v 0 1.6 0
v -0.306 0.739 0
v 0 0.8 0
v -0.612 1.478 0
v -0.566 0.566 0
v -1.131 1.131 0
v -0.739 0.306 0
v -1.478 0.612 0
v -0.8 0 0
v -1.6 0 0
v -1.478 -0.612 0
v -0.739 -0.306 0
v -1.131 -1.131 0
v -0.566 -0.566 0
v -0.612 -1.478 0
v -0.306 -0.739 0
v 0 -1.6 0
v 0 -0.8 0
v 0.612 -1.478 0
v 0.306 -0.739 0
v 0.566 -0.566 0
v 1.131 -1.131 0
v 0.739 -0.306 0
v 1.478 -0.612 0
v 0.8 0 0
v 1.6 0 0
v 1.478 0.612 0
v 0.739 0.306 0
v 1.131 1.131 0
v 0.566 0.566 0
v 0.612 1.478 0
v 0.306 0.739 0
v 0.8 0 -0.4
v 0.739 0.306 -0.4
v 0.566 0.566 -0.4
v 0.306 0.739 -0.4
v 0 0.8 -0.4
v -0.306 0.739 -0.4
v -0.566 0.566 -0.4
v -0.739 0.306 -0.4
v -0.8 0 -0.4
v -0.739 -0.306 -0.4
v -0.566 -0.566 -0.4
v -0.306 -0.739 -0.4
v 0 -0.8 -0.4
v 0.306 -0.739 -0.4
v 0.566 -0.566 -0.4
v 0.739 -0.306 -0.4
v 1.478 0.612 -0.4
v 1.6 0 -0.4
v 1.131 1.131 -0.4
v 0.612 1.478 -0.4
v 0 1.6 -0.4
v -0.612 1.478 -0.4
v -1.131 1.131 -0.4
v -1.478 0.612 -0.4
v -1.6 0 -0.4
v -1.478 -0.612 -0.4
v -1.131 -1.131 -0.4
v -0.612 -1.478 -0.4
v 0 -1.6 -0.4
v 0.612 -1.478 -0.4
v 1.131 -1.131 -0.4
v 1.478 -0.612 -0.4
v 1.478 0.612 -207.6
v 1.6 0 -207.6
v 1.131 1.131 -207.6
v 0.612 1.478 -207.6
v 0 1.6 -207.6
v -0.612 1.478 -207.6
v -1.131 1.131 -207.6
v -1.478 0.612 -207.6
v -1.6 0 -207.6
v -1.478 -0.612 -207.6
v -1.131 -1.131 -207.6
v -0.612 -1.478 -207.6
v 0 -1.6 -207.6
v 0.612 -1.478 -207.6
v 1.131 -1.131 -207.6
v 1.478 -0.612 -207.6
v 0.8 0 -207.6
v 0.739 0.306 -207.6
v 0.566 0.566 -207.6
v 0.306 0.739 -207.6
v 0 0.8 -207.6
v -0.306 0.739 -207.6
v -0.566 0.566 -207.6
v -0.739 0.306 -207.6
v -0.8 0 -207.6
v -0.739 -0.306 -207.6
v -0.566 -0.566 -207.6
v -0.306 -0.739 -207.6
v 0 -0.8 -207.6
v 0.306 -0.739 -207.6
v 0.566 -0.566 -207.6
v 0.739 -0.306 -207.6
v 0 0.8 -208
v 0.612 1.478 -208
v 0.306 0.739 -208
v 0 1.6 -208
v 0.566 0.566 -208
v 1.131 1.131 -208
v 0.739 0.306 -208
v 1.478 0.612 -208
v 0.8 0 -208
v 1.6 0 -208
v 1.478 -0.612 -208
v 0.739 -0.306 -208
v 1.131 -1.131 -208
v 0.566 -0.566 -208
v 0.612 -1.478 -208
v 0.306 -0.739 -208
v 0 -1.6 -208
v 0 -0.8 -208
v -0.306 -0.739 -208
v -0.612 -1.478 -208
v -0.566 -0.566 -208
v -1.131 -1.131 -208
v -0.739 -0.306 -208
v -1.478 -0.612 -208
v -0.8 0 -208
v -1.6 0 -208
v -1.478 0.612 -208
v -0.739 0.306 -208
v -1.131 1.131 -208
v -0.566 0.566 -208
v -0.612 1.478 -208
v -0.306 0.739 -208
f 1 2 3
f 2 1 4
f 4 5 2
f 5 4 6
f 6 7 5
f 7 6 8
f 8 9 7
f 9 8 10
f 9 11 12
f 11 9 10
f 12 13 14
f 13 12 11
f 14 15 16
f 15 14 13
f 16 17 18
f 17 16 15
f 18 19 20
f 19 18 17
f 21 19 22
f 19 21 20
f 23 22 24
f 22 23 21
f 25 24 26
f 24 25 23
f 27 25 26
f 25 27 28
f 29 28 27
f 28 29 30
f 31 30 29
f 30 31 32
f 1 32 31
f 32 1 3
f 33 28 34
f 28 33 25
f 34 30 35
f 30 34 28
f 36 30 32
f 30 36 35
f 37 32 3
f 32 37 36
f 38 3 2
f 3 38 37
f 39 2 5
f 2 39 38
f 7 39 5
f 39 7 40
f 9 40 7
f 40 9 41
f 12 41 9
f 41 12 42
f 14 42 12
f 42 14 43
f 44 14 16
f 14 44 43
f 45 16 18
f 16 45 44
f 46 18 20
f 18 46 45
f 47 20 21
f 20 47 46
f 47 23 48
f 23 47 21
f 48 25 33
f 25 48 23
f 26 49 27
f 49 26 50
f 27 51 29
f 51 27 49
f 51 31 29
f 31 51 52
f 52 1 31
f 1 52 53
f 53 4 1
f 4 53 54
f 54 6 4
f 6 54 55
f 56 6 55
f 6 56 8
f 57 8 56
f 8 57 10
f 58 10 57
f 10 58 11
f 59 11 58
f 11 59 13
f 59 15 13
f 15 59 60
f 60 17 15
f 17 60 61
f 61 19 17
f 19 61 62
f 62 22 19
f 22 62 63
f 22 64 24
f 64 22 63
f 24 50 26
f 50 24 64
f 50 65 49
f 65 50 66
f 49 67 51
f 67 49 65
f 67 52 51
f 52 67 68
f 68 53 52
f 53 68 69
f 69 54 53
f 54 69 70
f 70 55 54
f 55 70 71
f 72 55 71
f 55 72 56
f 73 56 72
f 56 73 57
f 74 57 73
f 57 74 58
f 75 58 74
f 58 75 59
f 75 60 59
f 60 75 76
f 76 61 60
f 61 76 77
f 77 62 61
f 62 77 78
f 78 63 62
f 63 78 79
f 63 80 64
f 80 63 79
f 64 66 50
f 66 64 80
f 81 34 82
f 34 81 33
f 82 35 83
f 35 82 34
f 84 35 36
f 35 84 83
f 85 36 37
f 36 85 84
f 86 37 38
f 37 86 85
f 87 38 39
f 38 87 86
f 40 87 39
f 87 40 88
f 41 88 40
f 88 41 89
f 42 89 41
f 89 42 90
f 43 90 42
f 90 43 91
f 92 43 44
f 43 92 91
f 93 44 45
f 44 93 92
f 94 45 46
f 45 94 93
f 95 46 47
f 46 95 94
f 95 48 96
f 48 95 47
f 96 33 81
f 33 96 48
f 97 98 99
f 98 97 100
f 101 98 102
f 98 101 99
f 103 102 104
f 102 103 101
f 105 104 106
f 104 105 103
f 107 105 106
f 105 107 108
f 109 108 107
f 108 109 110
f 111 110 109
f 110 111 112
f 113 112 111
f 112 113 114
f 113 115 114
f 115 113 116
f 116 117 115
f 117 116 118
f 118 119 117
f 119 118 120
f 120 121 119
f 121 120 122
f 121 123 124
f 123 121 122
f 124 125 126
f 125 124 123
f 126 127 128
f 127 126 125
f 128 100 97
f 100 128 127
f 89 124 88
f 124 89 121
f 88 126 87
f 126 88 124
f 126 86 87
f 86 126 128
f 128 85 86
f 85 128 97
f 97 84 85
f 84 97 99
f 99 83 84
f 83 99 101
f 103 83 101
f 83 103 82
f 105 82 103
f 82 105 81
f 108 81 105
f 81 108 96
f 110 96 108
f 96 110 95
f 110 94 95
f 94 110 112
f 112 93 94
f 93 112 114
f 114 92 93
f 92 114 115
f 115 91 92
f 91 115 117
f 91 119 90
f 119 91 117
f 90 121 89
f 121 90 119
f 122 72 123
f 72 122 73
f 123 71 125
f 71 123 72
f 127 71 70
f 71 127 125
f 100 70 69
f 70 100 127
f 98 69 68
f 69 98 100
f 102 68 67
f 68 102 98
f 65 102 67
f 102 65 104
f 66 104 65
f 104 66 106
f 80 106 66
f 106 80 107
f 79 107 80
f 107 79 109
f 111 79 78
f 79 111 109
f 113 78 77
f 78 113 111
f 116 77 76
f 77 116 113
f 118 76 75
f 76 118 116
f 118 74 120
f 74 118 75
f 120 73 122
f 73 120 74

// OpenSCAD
// file: ../p/4-4ring1.scad
use <../lib.scad>
function ldraw_lib__4_4ring1() = [
// 0 Ring  1 x 1.0
// 0 Name: 4-4ring1.dat
// 0 Author: James Jessiman
// 0 !LDRAW_ORG Primitive UPDATE 2009-01
// 0 !LICENSE Licensed under CC BY 4.0 : see CAreadme.txt
// 
// 0 BFC CERTIFY CCW
  [0,"BFC","CERTIFY"],
  [0,"BFC","CCW"],
// 
// 0 !HISTORY 1998-12-15 [PTadmin] Official Update 1998-10
// 0 !HISTORY 2002-04-08 [BrickCaster] Modified for BFC compliance
// 0 !HISTORY 2002-04-25 [PTadmin] Official Update 2002-02
// 0 !HISTORY 2007-06-24 [PTadmin] Header formatted for Contributor Agreement
// 0 !HISTORY 2008-07-01 [PTadmin] Official Update 2008-01
// 0 !HISTORY 2008-08-26 [cwdee] Switch polygon winding and rename
// 0 !HISTORY 2009-05-02 [PTadmin] Official Update 2009-01
// 
// 
// 4 16 -0.7654 0 1.8478 -0.3827 0 0.9239 0 0 1 0 0 2
  [4,16,-0.7654,0,1.8478,-0.3827,0,0.9239,0,0,1,0,0,2],
// 4 16 -1.4142 0 1.4142 -0.7071 0 0.7071 -0.3827 0 0.9239 -0.7654 0 1.8478
  [4,16,-1.4142,0,1.4142,-0.7071,0,0.7071,-0.3827,0,0.9239,-0.7654,0,1.8478],
// 4 16 -1.8478 0 0.7654 -0.9239 0 0.3827 -0.7071 0 0.7071 -1.4142 0 1.41420
  [4,16,-1.8478,0,0.7654,-0.9239,0,0.3827,-0.7071,0,0.7071,-1.4142,0,1.41420],
// 4 16 -2 0 0 -1 0 0 -0.9239 0 0.3827 -1.8478 0 0.7654
  [4,16,-2,0,0,-1,0,0,-0.9239,0,0.3827,-1.8478,0,0.7654],
// 4 16 -1.8478 0 -0.7654 -0.9239 0 -0.3827 -1 0 0 -2 0 0
  [4,16,-1.8478,0,-0.7654,-0.9239,0,-0.3827,-1,0,0,-2,0,0],
// 4 16 -1.4142 0 -1.4142 -0.7071 0 -0.7071 -0.9239 0 -0.3827 -1.8478 0 -0.7654
  [4,16,-1.4142,0,-1.4142,-0.7071,0,-0.7071,-0.9239,0,-0.3827,-1.8478,0,-0.7654],
// 4 16 -0.7654 0 -1.8478 -0.3827 0 -0.9239 -0.7071 0 -0.7071 -1.4142 0 -1.4142
  [4,16,-0.7654,0,-1.8478,-0.3827,0,-0.9239,-0.7071,0,-0.7071,-1.4142,0,-1.4142],
// 4 16 0 0 -2 0 0 -1 -0.3827 0 -0.9239 -0.7654 0 -1.8478
  [4,16,0,0,-2,0,0,-1,-0.3827,0,-0.9239,-0.7654,0,-1.8478],
// 4 16 0.7654 0 -1.8478 0.3827 0 -0.9239 0 0 -1 0 0 -2
  [4,16,0.7654,0,-1.8478,0.3827,0,-0.9239,0,0,-1,0,0,-2],
// 4 16 1.4142 0 -1.4142 0.7071 0 -0.7071 0.3827 0 -0.9239 0.7654 0 -1.8478
  [4,16,1.4142,0,-1.4142,0.7071,0,-0.7071,0.3827,0,-0.9239,0.7654,0,-1.8478],
// 4 16 1.8478 0 -0.7654 0.9239 0 -0.3827 0.7071 0 -0.7071 1.4142 0 -1.4142
  [4,16,1.8478,0,-0.7654,0.9239,0,-0.3827,0.7071,0,-0.7071,1.4142,0,-1.4142],
// 4 16 2 0 0 1 0 0 0.9239 0 -0.3827 1.8478 0 -0.7654
  [4,16,2,0,0,1,0,0,0.9239,0,-0.3827,1.8478,0,-0.7654],
// 4 16 1.8478 0 0.7654 0.9239 0 0.3827 1 0 0 2 0 0
  [4,16,1.8478,0,0.7654,0.9239,0,0.3827,1,0,0,2,0,0],
// 4 16 1.4142 0 1.4142 0.7071 0 0.7071 0.9239 0 0.3827 1.8478 0 0.7654
  [4,16,1.4142,0,1.4142,0.7071,0,0.7071,0.9239,0,0.3827,1.8478,0,0.7654],
// 4 16 0.7654 0 1.8478 0.3827 0 0.9239 0.7071 0 0.7071 1.4142 0 1.4142
  [4,16,0.7654,0,1.8478,0.3827,0,0.9239,0.7071,0,0.7071,1.4142,0,1.4142],
// 4 16 0 0 2 0 0 1 0.3827 0 0.9239 0.7654 0 1.8478
  [4,16,0,0,2,0,0,1,0.3827,0,0.9239,0.7654,0,1.8478],
// 0
];
module ldraw_lib__4_4ring1(step=0, col=false, unit=2/5, alt=false, line=0.2, solid=!$preview)
    makepoly(ldraw_lib__4_4ring1(), step=step, col=col, unit=unit, alt=alt, line=line, solid=solid);
ldraw_lib__4_4ring1(line=0.2);
// file: ../p/4-4edge.scad
use <../lib.scad>
function ldraw_lib__4_4edge() = [
// 0 Circle 1.0
// 0 Name: 4-4edge.dat
// 0 Author: James Jessiman
// 0 !LDRAW_ORG Primitive UPDATE 2017-01
// 0 !LICENSE Licensed under CC BY 4.0 : see CAreadme.txt
// 
// 0 BFC CERTIFY CCW
  [0,"BFC","CERTIFY"],
  [0,"BFC","CCW"],
// 
// 0 !HISTORY 1998-12-15 [PTadmin] Official Update 1998-10
// 0 !HISTORY 2005-12-28 [PTadmin] Official Update 2005-01
// 0 !HISTORY 2007-06-24 [PTadmin] Header formatted for Contributor Agreement
// 0 !HISTORY 2008-07-01 [PTadmin] Official Update 2008-01
// 0 !HISTORY 2017-01-15 [Steffen] BFCed
// 0 !HISTORY 2017-12-30 [PTadmin] Official Update 2017-01
// 
// 
// 2 24 1 0 0 0.9239 0 0.3827
  [2,24,1,0,0,0.9239,0,0.3827],
// 2 24 0.9239 0 0.3827 0.7071 0 0.7071
  [2,24,0.9239,0,0.3827,0.7071,0,0.7071],
// 2 24 0.7071 0 0.7071 0.3827 0 0.9239
  [2,24,0.7071,0,0.7071,0.3827,0,0.9239],
// 2 24 0.3827 0 0.9239 0 0 1
  [2,24,0.3827,0,0.9239,0,0,1],
// 2 24 0 0 1 -0.3827 0 0.9239
  [2,24,0,0,1,-0.3827,0,0.9239],
// 2 24 -0.3827 0 0.9239 -0.7071 0 0.7071
  [2,24,-0.3827,0,0.9239,-0.7071,0,0.7071],
// 2 24 -0.7071 0 0.7071 -0.9239 0 0.3827
  [2,24,-0.7071,0,0.7071,-0.9239,0,0.3827],
// 2 24 -0.9239 0 0.3827 -1 0 -0
  [2,24,-0.9239,0,0.3827,-1,0,-0],
// 2 24 -1 0 -0 -0.9239 0 -0.3827
  [2,24,-1,0,-0,-0.9239,0,-0.3827],
// 2 24 -0.9239 0 -0.3827 -0.7071 0 -0.7071
  [2,24,-0.9239,0,-0.3827,-0.7071,0,-0.7071],
// 2 24 -0.7071 0 -0.7071 -0.3827 0 -0.9239
  [2,24,-0.7071,0,-0.7071,-0.3827,0,-0.9239],
// 2 24 -0.3827 0 -0.9239 0 0 -1
  [2,24,-0.3827,0,-0.9239,0,0,-1],
// 2 24 0 0 -1 0.3827 0 -0.9239
  [2,24,0,0,-1,0.3827,0,-0.9239],
// 2 24 0.3827 0 -0.9239 0.7071 0 -0.7071
  [2,24,0.3827,0,-0.9239,0.7071,0,-0.7071],
// 2 24 0.7071 0 -0.7071 0.9239 0 -0.3827
  [2,24,0.7071,0,-0.7071,0.9239,0,-0.3827],
// 2 24 0.9239 0 -0.3827 1 0 0
  [2,24,0.9239,0,-0.3827,1,0,0],
];
module ldraw_lib__4_4edge(step=0, col=false, unit=2/5, alt=false, line=0.2, solid=!$preview)
    makepoly(ldraw_lib__4_4edge(), step=step, col=col, unit=unit, alt=alt, line=line, solid=solid);
ldraw_lib__4_4edge(line=0.2);
// file: ../p/4-4cyli.scad
use <../lib.scad>
function ldraw_lib__4_4cyli() = [
// 0 Cylinder 1.0
// 0 Name: 4-4cyli.dat
// 0 Author: James Jessiman
// 0 !LDRAW_ORG Primitive UPDATE 2005-01
// 0 !LICENSE Licensed under CC BY 4.0 : see CAreadme.txt
// 
// 0 BFC CERTIFY CCW
  [0,"BFC","CERTIFY"],
  [0,"BFC","CCW"],
// 
// 0 !HISTORY 1998-12-15 [PTadmin] Official Update 1998-10
// 0 !HISTORY 2002-03-23 [sbliss] Added BFC statement; merged headers from files in distributions LDraw 0.27 and Complete.
// 0 !HISTORY 2002-04-25 [PTadmin] Official Update 2002-02
// 0 !HISTORY 2004-12-14 [guyvivan] BFC CCW
// 0 !HISTORY 2005-12-28 [PTadmin] Official Update 2005-01
// 0 !HISTORY 2007-06-24 [PTadmin] Header formatted for Contributor Agreement
// 0 !HISTORY 2008-07-01 [PTadmin] Official Update 2008-01
// 
// 
// 4 16 1 1 0 0.9239 1 0.3827 0.9239 0 0.3827 1 0 0
  [4,16,1,1,0,0.9239,1,0.3827,0.9239,0,0.3827,1,0,0],
// 5 24 1 0 0 1 1 0 0.9239 0 0.3827 0.9239 0 -0.3827
  [5,24,1,0,0,1,1,0,0.9239,0,0.3827,0.9239,0,-0.3827],
// 4 16 0.9239 1 0.3827 0.7071 1 0.7071 0.7071 0 0.7071 0.9239 0 0.3827
  [4,16,0.9239,1,0.3827,0.7071,1,0.7071,0.7071,0,0.7071,0.9239,0,0.3827],
// 5 24 0.9239 0 0.3827 0.9239 1 0.3827 0.7071 0 0.7071 1 0 0
  [5,24,0.9239,0,0.3827,0.9239,1,0.3827,0.7071,0,0.7071,1,0,0],
// 4 16 0.7071 1 0.7071 0.3827 1 0.9239 0.3827 0 0.9239 0.7071 0 0.7071
  [4,16,0.7071,1,0.7071,0.3827,1,0.9239,0.3827,0,0.9239,0.7071,0,0.7071],
// 5 24 0.7071 0 0.7071 0.7071 1 0.7071 0.3827 0 0.9239 0.9239 0 0.3827
  [5,24,0.7071,0,0.7071,0.7071,1,0.7071,0.3827,0,0.9239,0.9239,0,0.3827],
// 4 16 0.3827 1 0.9239 0 1 1 0 0 1 0.3827 0 0.9239
  [4,16,0.3827,1,0.9239,0,1,1,0,0,1,0.3827,0,0.9239],
// 5 24 0.3827 0 0.9239 0.3827 1 0.9239 0 0 1 0.7071 0 0.7071
  [5,24,0.3827,0,0.9239,0.3827,1,0.9239,0,0,1,0.7071,0,0.7071],
// 4 16 0 1 1 -0.3827 1 0.9239 -0.3827 0 0.9239 0 0 1
  [4,16,0,1,1,-0.3827,1,0.9239,-0.3827,0,0.9239,0,0,1],
// 5 24 0 0 1 0 1 1 -0.3827 0 0.9239 0.3827 0 0.9239
  [5,24,0,0,1,0,1,1,-0.3827,0,0.9239,0.3827,0,0.9239],
// 4 16 -0.3827 1 0.9239 -0.7071 1 0.7071 -0.7071 0 0.7071 -0.3827 0 0.9239
  [4,16,-0.3827,1,0.9239,-0.7071,1,0.7071,-0.7071,0,0.7071,-0.3827,0,0.9239],
// 5 24 -0.3827 0 0.9239 -0.3827 1 0.9239 -0.7071 0 0.7071 0 0 1
  [5,24,-0.3827,0,0.9239,-0.3827,1,0.9239,-0.7071,0,0.7071,0,0,1],
// 4 16 -0.7071 1 0.7071 -0.9239 1 0.3827 -0.9239 0 0.3827 -0.7071 0 0.7071
  [4,16,-0.7071,1,0.7071,-0.9239,1,0.3827,-0.9239,0,0.3827,-0.7071,0,0.7071],
// 5 24 -0.7071 0 0.7071 -0.7071 1 0.7071 -0.9239 0 0.3827 -0.3827 0 0.9239
  [5,24,-0.7071,0,0.7071,-0.7071,1,0.7071,-0.9239,0,0.3827,-0.3827,0,0.9239],
// 4 16 -0.9239 1 0.3827 -1 1 0 -1 0 0 -0.9239 0 0.3827
  [4,16,-0.9239,1,0.3827,-1,1,0,-1,0,0,-0.9239,0,0.3827],
// 5 24 -0.9239 0 0.3827 -0.9239 1 0.3827 -1 0 0 -0.7071 0 0.7071
  [5,24,-0.9239,0,0.3827,-0.9239,1,0.3827,-1,0,0,-0.7071,0,0.7071],
// 4 16 -1 1 0 -0.9239 1 -0.3827 -0.9239 0 -0.3827 -1 0 0
  [4,16,-1,1,0,-0.9239,1,-0.3827,-0.9239,0,-0.3827,-1,0,0],
// 5 24 -1 0 0 -1 1 0 -0.9239 0 -0.3827 -0.9239 0 0.3827
  [5,24,-1,0,0,-1,1,0,-0.9239,0,-0.3827,-0.9239,0,0.3827],
// 4 16 -0.9239 1 -0.3827 -0.7071 1 -0.7071 -0.7071 0 -0.7071 -0.9239 0 -0.3827
  [4,16,-0.9239,1,-0.3827,-0.7071,1,-0.7071,-0.7071,0,-0.7071,-0.9239,0,-0.3827],
// 5 24 -0.9239 0 -0.3827 -0.9239 1 -0.3827 -0.7071 0 -0.7071 -1 0 0
  [5,24,-0.9239,0,-0.3827,-0.9239,1,-0.3827,-0.7071,0,-0.7071,-1,0,0],
// 4 16 -0.7071 1 -0.7071 -0.3827 1 -0.9239 -0.3827 0 -0.9239 -0.7071 0 -0.7071
  [4,16,-0.7071,1,-0.7071,-0.3827,1,-0.9239,-0.3827,0,-0.9239,-0.7071,0,-0.7071],
// 5 24 -0.7071 0 -0.7071 -0.7071 1 -0.7071 -0.3827 0 -0.9239 -0.9239 0 -0.3827
  [5,24,-0.7071,0,-0.7071,-0.7071,1,-0.7071,-0.3827,0,-0.9239,-0.9239,0,-0.3827],
// 4 16 -0.3827 1 -0.9239 0 1 -1 0 0 -1 -0.3827 0 -0.9239
  [4,16,-0.3827,1,-0.9239,0,1,-1,0,0,-1,-0.3827,0,-0.9239],
// 5 24 -0.3827 0 -0.9239 -0.3827 1 -0.9239 0 0 -1 -0.7071 0 -0.7071
  [5,24,-0.3827,0,-0.9239,-0.3827,1,-0.9239,0,0,-1,-0.7071,0,-0.7071],
// 4 16 0 1 -1 0.3827 1 -0.9239 0.3827 0 -0.9239 0 0 -1
  [4,16,0,1,-1,0.3827,1,-0.9239,0.3827,0,-0.9239,0,0,-1],
// 5 24 0 0 -1 0 1 -1 0.3827 0 -0.9239 -0.3827 0 -0.9239
  [5,24,0,0,-1,0,1,-1,0.3827,0,-0.9239,-0.3827,0,-0.9239],
// 4 16 0.3827 1 -0.9239 0.7071 1 -0.7071 0.7071 0 -0.7071 0.3827 0 -0.9239
  [4,16,0.3827,1,-0.9239,0.7071,1,-0.7071,0.7071,0,-0.7071,0.3827,0,-0.9239],
// 5 24 0.3827 0 -0.9239 0.3827 1 -0.9239 0.7071 0 -0.7071 0 0 -1
  [5,24,0.3827,0,-0.9239,0.3827,1,-0.9239,0.7071,0,-0.7071,0,0,-1],
// 4 16 0.7071 1 -0.7071 0.9239 1 -0.3827 0.9239 0 -0.3827 0.7071 0 -0.7071
  [4,16,0.7071,1,-0.7071,0.9239,1,-0.3827,0.9239,0,-0.3827,0.7071,0,-0.7071],
// 5 24 0.7071 0 -0.7071 0.7071 1 -0.7071 0.9239 0 -0.3827 0.3827 0 -0.9239
  [5,24,0.7071,0,-0.7071,0.7071,1,-0.7071,0.9239,0,-0.3827,0.3827,0,-0.9239],
// 4 16 0.9239 1 -0.3827 1 1 0 1 0 0 0.9239 0 -0.3827
  [4,16,0.9239,1,-0.3827,1,1,0,1,0,0,0.9239,0,-0.3827],
// 5 24 0.9239 0 -0.3827 0.9239 1 -0.3827 1 0 0 0.7071 0 -0.7071
  [5,24,0.9239,0,-0.3827,0.9239,1,-0.3827,1,0,0,0.7071,0,-0.7071],
// 0
];
module ldraw_lib__4_4cyli(step=0, col=false, unit=2/5, alt=false, line=0.2, solid=!$preview)
    makepoly(ldraw_lib__4_4cyli(), step=step, col=col, unit=unit, alt=alt, line=line, solid=solid);
ldraw_lib__4_4cyli(line=0.2);
// file: u9053.scad
use <../lib.scad>
use <../p/4-4cyli.scad>
use <../p/4-4edge.scad>
use <../p/4-4ring1.scad>
function ldraw_lib__u9053() = [
// 0 ~Technic Flex-System Hose End
// 0 Name: u9053.dat
// 0 Author: William Howard [WilliamH]
// 0 !LDRAW_ORG Part UPDATE 2011-02
// 0 !LICENSE Licensed under CC BY 2.0 and CC BY 4.0 : see CAreadme.txt
// 
// 0 BFC CERTIFY CCW
  [0,"BFC","CERTIFY"],
  [0,"BFC","CCW"],
// 
// 0 !HISTORY 2011-12-21 [cwdee] Reworked subparting technique
// 0 !HISTORY 2011-12-23 [PTadmin] Renamed from 76
// 0 !HISTORY 2011-12-29 [PTadmin] Official Update 2011-02
// 
// 
// 1 16 0 0 0 2 0 0 0 1 0 0 0 2 4-4ring1.dat
  [1,16,0,0,0,2,0,0,0,1,0,0,0,2, ldraw_lib__4_4ring1()],
// 1 16 0 0 0 2 0 0 0 1 0 0 0 2 4-4edge.dat
  [1,16,0,0,0,2,0,0,0,1,0,0,0,2, ldraw_lib__4_4edge()],
// 0 BFC INVERTNEXT
  [0,"BFC","INVERTNEXT"],
// 1 16 0 0 0 2 0 0 0 1 0 0 0 2 4-4cyli.dat
  [1,16,0,0,0,2,0,0,0,1,0,0,0,2, ldraw_lib__4_4cyli()],
// 1 16 0 0 0 4 0 0 0 1 0 0 0 4 4-4edge.dat
  [1,16,0,0,0,4,0,0,0,1,0,0,0,4, ldraw_lib__4_4edge()],
// 1 16 0 0 0 4 0 0 0 1 0 0 0 4 4-4cyli.dat
  [1,16,0,0,0,4,0,0,0,1,0,0,0,4, ldraw_lib__4_4cyli()],
// 0
];
module ldraw_lib__u9053(step=0, col=false, unit=2/5, alt=false, line=0.2, solid=!$preview)
    makepoly(ldraw_lib__u9053(), step=step, col=col, unit=unit, alt=alt, line=line, solid=solid);
ldraw_lib__u9053(line=0.2);
// file: 77.scad
use <../lib.scad>
use <../p/4-4cyli.scad>
function ldraw_lib__77() = [
// 0 ~Technic Flex-System Hose Segment
// 0 Name: 77.dat
// 0 Author: William Howard [WilliamH]
// 0 !LDRAW_ORG Part UPDATE 2011-02
// 0 !LICENSE Licensed under CC BY 2.0 and CC BY 4.0 : see CAreadme.txt
// 
// 0 BFC CERTIFY CCW
  [0,"BFC","CERTIFY"],
  [0,"BFC","CCW"],
// 
// 0 !HISTORY 2011-12-21 [cwdee] Reworked subparting technique
// 0 !HISTORY 2011-12-29 [PTadmin] Official Update 2011-02
// 
// 
// 1 16 0 0 0 4 0 0 0 1 0 0 0 4 4-4cyli.dat
  [1,16,0,0,0,4,0,0,0,1,0,0,0,4, ldraw_lib__4_4cyli()],
// 0 BFC INVERTNEXT
  [0,"BFC","INVERTNEXT"],
// 1 16 0 0 0 2 0 0 0 1 0 0 0 2 4-4cyli.dat
  [1,16,0,0,0,2,0,0,0,1,0,0,0,2, ldraw_lib__4_4cyli()],
// 0
];
module ldraw_lib__77(step=0, col=false, unit=2/5, alt=false, line=0.2, solid=!$preview)
    makepoly(ldraw_lib__77(), step=step, col=col, unit=unit, alt=alt, line=line, solid=solid);
ldraw_lib__77(line=0.2);
// main file
use <../lib.scad>
use <77.scad>
use <u9053.scad>
function ldraw_lib__53475() = [
// 0 Technic Flex-System Hose 26L (520LDU)
// 0 Name: 53475.dat
// 0 Author: Tim Gould [timgould]
// 0 !LDRAW_ORG Part UPDATE 2011-02
// 0 !LICENSE Licensed under CC BY 4.0 : see CAreadme.txt
// 
// 0 BFC CERTIFY CCW
  [0,"BFC","CERTIFY"],
  [0,"BFC","CCW"],
// 
// 0 !KEYWORDS bar, BrickLink 75c26, Rebrickable 75c26, tube
// 
// 0 !HISTORY 2011-12-29 [PTadmin] Official Update 2011-02
// 
// 
// 1 16 0 0 0 1 0 0 0 1 0 0 0 1 u9053.dat
  [1,16,0,0,0,1,0,0,0,1,0,0,0,1, ldraw_lib__u9053()],
// 1 16 0 1 0 1 0 0 0 518 0 0 0 1 77.dat
  [1,16,0,1,0,1,0,0,0,518,0,0,0,1, ldraw_lib__77()],
// 1 16 0 520 0 -1 0 0 0 -1 0 0 0 1 u9053.dat
  [1,16,0,520,0,-1,0,0,0,-1,0,0,0,1, ldraw_lib__u9053()],
];
module ldraw_lib__53475(step=0, col=false, unit=2/5, alt=false, line=0.2, solid=!$preview)
    makepoly(ldraw_lib__53475(), step=step, col=col, unit=unit, alt=alt, line=line, solid=solid);
ldraw_lib__53475(line=0.2);
